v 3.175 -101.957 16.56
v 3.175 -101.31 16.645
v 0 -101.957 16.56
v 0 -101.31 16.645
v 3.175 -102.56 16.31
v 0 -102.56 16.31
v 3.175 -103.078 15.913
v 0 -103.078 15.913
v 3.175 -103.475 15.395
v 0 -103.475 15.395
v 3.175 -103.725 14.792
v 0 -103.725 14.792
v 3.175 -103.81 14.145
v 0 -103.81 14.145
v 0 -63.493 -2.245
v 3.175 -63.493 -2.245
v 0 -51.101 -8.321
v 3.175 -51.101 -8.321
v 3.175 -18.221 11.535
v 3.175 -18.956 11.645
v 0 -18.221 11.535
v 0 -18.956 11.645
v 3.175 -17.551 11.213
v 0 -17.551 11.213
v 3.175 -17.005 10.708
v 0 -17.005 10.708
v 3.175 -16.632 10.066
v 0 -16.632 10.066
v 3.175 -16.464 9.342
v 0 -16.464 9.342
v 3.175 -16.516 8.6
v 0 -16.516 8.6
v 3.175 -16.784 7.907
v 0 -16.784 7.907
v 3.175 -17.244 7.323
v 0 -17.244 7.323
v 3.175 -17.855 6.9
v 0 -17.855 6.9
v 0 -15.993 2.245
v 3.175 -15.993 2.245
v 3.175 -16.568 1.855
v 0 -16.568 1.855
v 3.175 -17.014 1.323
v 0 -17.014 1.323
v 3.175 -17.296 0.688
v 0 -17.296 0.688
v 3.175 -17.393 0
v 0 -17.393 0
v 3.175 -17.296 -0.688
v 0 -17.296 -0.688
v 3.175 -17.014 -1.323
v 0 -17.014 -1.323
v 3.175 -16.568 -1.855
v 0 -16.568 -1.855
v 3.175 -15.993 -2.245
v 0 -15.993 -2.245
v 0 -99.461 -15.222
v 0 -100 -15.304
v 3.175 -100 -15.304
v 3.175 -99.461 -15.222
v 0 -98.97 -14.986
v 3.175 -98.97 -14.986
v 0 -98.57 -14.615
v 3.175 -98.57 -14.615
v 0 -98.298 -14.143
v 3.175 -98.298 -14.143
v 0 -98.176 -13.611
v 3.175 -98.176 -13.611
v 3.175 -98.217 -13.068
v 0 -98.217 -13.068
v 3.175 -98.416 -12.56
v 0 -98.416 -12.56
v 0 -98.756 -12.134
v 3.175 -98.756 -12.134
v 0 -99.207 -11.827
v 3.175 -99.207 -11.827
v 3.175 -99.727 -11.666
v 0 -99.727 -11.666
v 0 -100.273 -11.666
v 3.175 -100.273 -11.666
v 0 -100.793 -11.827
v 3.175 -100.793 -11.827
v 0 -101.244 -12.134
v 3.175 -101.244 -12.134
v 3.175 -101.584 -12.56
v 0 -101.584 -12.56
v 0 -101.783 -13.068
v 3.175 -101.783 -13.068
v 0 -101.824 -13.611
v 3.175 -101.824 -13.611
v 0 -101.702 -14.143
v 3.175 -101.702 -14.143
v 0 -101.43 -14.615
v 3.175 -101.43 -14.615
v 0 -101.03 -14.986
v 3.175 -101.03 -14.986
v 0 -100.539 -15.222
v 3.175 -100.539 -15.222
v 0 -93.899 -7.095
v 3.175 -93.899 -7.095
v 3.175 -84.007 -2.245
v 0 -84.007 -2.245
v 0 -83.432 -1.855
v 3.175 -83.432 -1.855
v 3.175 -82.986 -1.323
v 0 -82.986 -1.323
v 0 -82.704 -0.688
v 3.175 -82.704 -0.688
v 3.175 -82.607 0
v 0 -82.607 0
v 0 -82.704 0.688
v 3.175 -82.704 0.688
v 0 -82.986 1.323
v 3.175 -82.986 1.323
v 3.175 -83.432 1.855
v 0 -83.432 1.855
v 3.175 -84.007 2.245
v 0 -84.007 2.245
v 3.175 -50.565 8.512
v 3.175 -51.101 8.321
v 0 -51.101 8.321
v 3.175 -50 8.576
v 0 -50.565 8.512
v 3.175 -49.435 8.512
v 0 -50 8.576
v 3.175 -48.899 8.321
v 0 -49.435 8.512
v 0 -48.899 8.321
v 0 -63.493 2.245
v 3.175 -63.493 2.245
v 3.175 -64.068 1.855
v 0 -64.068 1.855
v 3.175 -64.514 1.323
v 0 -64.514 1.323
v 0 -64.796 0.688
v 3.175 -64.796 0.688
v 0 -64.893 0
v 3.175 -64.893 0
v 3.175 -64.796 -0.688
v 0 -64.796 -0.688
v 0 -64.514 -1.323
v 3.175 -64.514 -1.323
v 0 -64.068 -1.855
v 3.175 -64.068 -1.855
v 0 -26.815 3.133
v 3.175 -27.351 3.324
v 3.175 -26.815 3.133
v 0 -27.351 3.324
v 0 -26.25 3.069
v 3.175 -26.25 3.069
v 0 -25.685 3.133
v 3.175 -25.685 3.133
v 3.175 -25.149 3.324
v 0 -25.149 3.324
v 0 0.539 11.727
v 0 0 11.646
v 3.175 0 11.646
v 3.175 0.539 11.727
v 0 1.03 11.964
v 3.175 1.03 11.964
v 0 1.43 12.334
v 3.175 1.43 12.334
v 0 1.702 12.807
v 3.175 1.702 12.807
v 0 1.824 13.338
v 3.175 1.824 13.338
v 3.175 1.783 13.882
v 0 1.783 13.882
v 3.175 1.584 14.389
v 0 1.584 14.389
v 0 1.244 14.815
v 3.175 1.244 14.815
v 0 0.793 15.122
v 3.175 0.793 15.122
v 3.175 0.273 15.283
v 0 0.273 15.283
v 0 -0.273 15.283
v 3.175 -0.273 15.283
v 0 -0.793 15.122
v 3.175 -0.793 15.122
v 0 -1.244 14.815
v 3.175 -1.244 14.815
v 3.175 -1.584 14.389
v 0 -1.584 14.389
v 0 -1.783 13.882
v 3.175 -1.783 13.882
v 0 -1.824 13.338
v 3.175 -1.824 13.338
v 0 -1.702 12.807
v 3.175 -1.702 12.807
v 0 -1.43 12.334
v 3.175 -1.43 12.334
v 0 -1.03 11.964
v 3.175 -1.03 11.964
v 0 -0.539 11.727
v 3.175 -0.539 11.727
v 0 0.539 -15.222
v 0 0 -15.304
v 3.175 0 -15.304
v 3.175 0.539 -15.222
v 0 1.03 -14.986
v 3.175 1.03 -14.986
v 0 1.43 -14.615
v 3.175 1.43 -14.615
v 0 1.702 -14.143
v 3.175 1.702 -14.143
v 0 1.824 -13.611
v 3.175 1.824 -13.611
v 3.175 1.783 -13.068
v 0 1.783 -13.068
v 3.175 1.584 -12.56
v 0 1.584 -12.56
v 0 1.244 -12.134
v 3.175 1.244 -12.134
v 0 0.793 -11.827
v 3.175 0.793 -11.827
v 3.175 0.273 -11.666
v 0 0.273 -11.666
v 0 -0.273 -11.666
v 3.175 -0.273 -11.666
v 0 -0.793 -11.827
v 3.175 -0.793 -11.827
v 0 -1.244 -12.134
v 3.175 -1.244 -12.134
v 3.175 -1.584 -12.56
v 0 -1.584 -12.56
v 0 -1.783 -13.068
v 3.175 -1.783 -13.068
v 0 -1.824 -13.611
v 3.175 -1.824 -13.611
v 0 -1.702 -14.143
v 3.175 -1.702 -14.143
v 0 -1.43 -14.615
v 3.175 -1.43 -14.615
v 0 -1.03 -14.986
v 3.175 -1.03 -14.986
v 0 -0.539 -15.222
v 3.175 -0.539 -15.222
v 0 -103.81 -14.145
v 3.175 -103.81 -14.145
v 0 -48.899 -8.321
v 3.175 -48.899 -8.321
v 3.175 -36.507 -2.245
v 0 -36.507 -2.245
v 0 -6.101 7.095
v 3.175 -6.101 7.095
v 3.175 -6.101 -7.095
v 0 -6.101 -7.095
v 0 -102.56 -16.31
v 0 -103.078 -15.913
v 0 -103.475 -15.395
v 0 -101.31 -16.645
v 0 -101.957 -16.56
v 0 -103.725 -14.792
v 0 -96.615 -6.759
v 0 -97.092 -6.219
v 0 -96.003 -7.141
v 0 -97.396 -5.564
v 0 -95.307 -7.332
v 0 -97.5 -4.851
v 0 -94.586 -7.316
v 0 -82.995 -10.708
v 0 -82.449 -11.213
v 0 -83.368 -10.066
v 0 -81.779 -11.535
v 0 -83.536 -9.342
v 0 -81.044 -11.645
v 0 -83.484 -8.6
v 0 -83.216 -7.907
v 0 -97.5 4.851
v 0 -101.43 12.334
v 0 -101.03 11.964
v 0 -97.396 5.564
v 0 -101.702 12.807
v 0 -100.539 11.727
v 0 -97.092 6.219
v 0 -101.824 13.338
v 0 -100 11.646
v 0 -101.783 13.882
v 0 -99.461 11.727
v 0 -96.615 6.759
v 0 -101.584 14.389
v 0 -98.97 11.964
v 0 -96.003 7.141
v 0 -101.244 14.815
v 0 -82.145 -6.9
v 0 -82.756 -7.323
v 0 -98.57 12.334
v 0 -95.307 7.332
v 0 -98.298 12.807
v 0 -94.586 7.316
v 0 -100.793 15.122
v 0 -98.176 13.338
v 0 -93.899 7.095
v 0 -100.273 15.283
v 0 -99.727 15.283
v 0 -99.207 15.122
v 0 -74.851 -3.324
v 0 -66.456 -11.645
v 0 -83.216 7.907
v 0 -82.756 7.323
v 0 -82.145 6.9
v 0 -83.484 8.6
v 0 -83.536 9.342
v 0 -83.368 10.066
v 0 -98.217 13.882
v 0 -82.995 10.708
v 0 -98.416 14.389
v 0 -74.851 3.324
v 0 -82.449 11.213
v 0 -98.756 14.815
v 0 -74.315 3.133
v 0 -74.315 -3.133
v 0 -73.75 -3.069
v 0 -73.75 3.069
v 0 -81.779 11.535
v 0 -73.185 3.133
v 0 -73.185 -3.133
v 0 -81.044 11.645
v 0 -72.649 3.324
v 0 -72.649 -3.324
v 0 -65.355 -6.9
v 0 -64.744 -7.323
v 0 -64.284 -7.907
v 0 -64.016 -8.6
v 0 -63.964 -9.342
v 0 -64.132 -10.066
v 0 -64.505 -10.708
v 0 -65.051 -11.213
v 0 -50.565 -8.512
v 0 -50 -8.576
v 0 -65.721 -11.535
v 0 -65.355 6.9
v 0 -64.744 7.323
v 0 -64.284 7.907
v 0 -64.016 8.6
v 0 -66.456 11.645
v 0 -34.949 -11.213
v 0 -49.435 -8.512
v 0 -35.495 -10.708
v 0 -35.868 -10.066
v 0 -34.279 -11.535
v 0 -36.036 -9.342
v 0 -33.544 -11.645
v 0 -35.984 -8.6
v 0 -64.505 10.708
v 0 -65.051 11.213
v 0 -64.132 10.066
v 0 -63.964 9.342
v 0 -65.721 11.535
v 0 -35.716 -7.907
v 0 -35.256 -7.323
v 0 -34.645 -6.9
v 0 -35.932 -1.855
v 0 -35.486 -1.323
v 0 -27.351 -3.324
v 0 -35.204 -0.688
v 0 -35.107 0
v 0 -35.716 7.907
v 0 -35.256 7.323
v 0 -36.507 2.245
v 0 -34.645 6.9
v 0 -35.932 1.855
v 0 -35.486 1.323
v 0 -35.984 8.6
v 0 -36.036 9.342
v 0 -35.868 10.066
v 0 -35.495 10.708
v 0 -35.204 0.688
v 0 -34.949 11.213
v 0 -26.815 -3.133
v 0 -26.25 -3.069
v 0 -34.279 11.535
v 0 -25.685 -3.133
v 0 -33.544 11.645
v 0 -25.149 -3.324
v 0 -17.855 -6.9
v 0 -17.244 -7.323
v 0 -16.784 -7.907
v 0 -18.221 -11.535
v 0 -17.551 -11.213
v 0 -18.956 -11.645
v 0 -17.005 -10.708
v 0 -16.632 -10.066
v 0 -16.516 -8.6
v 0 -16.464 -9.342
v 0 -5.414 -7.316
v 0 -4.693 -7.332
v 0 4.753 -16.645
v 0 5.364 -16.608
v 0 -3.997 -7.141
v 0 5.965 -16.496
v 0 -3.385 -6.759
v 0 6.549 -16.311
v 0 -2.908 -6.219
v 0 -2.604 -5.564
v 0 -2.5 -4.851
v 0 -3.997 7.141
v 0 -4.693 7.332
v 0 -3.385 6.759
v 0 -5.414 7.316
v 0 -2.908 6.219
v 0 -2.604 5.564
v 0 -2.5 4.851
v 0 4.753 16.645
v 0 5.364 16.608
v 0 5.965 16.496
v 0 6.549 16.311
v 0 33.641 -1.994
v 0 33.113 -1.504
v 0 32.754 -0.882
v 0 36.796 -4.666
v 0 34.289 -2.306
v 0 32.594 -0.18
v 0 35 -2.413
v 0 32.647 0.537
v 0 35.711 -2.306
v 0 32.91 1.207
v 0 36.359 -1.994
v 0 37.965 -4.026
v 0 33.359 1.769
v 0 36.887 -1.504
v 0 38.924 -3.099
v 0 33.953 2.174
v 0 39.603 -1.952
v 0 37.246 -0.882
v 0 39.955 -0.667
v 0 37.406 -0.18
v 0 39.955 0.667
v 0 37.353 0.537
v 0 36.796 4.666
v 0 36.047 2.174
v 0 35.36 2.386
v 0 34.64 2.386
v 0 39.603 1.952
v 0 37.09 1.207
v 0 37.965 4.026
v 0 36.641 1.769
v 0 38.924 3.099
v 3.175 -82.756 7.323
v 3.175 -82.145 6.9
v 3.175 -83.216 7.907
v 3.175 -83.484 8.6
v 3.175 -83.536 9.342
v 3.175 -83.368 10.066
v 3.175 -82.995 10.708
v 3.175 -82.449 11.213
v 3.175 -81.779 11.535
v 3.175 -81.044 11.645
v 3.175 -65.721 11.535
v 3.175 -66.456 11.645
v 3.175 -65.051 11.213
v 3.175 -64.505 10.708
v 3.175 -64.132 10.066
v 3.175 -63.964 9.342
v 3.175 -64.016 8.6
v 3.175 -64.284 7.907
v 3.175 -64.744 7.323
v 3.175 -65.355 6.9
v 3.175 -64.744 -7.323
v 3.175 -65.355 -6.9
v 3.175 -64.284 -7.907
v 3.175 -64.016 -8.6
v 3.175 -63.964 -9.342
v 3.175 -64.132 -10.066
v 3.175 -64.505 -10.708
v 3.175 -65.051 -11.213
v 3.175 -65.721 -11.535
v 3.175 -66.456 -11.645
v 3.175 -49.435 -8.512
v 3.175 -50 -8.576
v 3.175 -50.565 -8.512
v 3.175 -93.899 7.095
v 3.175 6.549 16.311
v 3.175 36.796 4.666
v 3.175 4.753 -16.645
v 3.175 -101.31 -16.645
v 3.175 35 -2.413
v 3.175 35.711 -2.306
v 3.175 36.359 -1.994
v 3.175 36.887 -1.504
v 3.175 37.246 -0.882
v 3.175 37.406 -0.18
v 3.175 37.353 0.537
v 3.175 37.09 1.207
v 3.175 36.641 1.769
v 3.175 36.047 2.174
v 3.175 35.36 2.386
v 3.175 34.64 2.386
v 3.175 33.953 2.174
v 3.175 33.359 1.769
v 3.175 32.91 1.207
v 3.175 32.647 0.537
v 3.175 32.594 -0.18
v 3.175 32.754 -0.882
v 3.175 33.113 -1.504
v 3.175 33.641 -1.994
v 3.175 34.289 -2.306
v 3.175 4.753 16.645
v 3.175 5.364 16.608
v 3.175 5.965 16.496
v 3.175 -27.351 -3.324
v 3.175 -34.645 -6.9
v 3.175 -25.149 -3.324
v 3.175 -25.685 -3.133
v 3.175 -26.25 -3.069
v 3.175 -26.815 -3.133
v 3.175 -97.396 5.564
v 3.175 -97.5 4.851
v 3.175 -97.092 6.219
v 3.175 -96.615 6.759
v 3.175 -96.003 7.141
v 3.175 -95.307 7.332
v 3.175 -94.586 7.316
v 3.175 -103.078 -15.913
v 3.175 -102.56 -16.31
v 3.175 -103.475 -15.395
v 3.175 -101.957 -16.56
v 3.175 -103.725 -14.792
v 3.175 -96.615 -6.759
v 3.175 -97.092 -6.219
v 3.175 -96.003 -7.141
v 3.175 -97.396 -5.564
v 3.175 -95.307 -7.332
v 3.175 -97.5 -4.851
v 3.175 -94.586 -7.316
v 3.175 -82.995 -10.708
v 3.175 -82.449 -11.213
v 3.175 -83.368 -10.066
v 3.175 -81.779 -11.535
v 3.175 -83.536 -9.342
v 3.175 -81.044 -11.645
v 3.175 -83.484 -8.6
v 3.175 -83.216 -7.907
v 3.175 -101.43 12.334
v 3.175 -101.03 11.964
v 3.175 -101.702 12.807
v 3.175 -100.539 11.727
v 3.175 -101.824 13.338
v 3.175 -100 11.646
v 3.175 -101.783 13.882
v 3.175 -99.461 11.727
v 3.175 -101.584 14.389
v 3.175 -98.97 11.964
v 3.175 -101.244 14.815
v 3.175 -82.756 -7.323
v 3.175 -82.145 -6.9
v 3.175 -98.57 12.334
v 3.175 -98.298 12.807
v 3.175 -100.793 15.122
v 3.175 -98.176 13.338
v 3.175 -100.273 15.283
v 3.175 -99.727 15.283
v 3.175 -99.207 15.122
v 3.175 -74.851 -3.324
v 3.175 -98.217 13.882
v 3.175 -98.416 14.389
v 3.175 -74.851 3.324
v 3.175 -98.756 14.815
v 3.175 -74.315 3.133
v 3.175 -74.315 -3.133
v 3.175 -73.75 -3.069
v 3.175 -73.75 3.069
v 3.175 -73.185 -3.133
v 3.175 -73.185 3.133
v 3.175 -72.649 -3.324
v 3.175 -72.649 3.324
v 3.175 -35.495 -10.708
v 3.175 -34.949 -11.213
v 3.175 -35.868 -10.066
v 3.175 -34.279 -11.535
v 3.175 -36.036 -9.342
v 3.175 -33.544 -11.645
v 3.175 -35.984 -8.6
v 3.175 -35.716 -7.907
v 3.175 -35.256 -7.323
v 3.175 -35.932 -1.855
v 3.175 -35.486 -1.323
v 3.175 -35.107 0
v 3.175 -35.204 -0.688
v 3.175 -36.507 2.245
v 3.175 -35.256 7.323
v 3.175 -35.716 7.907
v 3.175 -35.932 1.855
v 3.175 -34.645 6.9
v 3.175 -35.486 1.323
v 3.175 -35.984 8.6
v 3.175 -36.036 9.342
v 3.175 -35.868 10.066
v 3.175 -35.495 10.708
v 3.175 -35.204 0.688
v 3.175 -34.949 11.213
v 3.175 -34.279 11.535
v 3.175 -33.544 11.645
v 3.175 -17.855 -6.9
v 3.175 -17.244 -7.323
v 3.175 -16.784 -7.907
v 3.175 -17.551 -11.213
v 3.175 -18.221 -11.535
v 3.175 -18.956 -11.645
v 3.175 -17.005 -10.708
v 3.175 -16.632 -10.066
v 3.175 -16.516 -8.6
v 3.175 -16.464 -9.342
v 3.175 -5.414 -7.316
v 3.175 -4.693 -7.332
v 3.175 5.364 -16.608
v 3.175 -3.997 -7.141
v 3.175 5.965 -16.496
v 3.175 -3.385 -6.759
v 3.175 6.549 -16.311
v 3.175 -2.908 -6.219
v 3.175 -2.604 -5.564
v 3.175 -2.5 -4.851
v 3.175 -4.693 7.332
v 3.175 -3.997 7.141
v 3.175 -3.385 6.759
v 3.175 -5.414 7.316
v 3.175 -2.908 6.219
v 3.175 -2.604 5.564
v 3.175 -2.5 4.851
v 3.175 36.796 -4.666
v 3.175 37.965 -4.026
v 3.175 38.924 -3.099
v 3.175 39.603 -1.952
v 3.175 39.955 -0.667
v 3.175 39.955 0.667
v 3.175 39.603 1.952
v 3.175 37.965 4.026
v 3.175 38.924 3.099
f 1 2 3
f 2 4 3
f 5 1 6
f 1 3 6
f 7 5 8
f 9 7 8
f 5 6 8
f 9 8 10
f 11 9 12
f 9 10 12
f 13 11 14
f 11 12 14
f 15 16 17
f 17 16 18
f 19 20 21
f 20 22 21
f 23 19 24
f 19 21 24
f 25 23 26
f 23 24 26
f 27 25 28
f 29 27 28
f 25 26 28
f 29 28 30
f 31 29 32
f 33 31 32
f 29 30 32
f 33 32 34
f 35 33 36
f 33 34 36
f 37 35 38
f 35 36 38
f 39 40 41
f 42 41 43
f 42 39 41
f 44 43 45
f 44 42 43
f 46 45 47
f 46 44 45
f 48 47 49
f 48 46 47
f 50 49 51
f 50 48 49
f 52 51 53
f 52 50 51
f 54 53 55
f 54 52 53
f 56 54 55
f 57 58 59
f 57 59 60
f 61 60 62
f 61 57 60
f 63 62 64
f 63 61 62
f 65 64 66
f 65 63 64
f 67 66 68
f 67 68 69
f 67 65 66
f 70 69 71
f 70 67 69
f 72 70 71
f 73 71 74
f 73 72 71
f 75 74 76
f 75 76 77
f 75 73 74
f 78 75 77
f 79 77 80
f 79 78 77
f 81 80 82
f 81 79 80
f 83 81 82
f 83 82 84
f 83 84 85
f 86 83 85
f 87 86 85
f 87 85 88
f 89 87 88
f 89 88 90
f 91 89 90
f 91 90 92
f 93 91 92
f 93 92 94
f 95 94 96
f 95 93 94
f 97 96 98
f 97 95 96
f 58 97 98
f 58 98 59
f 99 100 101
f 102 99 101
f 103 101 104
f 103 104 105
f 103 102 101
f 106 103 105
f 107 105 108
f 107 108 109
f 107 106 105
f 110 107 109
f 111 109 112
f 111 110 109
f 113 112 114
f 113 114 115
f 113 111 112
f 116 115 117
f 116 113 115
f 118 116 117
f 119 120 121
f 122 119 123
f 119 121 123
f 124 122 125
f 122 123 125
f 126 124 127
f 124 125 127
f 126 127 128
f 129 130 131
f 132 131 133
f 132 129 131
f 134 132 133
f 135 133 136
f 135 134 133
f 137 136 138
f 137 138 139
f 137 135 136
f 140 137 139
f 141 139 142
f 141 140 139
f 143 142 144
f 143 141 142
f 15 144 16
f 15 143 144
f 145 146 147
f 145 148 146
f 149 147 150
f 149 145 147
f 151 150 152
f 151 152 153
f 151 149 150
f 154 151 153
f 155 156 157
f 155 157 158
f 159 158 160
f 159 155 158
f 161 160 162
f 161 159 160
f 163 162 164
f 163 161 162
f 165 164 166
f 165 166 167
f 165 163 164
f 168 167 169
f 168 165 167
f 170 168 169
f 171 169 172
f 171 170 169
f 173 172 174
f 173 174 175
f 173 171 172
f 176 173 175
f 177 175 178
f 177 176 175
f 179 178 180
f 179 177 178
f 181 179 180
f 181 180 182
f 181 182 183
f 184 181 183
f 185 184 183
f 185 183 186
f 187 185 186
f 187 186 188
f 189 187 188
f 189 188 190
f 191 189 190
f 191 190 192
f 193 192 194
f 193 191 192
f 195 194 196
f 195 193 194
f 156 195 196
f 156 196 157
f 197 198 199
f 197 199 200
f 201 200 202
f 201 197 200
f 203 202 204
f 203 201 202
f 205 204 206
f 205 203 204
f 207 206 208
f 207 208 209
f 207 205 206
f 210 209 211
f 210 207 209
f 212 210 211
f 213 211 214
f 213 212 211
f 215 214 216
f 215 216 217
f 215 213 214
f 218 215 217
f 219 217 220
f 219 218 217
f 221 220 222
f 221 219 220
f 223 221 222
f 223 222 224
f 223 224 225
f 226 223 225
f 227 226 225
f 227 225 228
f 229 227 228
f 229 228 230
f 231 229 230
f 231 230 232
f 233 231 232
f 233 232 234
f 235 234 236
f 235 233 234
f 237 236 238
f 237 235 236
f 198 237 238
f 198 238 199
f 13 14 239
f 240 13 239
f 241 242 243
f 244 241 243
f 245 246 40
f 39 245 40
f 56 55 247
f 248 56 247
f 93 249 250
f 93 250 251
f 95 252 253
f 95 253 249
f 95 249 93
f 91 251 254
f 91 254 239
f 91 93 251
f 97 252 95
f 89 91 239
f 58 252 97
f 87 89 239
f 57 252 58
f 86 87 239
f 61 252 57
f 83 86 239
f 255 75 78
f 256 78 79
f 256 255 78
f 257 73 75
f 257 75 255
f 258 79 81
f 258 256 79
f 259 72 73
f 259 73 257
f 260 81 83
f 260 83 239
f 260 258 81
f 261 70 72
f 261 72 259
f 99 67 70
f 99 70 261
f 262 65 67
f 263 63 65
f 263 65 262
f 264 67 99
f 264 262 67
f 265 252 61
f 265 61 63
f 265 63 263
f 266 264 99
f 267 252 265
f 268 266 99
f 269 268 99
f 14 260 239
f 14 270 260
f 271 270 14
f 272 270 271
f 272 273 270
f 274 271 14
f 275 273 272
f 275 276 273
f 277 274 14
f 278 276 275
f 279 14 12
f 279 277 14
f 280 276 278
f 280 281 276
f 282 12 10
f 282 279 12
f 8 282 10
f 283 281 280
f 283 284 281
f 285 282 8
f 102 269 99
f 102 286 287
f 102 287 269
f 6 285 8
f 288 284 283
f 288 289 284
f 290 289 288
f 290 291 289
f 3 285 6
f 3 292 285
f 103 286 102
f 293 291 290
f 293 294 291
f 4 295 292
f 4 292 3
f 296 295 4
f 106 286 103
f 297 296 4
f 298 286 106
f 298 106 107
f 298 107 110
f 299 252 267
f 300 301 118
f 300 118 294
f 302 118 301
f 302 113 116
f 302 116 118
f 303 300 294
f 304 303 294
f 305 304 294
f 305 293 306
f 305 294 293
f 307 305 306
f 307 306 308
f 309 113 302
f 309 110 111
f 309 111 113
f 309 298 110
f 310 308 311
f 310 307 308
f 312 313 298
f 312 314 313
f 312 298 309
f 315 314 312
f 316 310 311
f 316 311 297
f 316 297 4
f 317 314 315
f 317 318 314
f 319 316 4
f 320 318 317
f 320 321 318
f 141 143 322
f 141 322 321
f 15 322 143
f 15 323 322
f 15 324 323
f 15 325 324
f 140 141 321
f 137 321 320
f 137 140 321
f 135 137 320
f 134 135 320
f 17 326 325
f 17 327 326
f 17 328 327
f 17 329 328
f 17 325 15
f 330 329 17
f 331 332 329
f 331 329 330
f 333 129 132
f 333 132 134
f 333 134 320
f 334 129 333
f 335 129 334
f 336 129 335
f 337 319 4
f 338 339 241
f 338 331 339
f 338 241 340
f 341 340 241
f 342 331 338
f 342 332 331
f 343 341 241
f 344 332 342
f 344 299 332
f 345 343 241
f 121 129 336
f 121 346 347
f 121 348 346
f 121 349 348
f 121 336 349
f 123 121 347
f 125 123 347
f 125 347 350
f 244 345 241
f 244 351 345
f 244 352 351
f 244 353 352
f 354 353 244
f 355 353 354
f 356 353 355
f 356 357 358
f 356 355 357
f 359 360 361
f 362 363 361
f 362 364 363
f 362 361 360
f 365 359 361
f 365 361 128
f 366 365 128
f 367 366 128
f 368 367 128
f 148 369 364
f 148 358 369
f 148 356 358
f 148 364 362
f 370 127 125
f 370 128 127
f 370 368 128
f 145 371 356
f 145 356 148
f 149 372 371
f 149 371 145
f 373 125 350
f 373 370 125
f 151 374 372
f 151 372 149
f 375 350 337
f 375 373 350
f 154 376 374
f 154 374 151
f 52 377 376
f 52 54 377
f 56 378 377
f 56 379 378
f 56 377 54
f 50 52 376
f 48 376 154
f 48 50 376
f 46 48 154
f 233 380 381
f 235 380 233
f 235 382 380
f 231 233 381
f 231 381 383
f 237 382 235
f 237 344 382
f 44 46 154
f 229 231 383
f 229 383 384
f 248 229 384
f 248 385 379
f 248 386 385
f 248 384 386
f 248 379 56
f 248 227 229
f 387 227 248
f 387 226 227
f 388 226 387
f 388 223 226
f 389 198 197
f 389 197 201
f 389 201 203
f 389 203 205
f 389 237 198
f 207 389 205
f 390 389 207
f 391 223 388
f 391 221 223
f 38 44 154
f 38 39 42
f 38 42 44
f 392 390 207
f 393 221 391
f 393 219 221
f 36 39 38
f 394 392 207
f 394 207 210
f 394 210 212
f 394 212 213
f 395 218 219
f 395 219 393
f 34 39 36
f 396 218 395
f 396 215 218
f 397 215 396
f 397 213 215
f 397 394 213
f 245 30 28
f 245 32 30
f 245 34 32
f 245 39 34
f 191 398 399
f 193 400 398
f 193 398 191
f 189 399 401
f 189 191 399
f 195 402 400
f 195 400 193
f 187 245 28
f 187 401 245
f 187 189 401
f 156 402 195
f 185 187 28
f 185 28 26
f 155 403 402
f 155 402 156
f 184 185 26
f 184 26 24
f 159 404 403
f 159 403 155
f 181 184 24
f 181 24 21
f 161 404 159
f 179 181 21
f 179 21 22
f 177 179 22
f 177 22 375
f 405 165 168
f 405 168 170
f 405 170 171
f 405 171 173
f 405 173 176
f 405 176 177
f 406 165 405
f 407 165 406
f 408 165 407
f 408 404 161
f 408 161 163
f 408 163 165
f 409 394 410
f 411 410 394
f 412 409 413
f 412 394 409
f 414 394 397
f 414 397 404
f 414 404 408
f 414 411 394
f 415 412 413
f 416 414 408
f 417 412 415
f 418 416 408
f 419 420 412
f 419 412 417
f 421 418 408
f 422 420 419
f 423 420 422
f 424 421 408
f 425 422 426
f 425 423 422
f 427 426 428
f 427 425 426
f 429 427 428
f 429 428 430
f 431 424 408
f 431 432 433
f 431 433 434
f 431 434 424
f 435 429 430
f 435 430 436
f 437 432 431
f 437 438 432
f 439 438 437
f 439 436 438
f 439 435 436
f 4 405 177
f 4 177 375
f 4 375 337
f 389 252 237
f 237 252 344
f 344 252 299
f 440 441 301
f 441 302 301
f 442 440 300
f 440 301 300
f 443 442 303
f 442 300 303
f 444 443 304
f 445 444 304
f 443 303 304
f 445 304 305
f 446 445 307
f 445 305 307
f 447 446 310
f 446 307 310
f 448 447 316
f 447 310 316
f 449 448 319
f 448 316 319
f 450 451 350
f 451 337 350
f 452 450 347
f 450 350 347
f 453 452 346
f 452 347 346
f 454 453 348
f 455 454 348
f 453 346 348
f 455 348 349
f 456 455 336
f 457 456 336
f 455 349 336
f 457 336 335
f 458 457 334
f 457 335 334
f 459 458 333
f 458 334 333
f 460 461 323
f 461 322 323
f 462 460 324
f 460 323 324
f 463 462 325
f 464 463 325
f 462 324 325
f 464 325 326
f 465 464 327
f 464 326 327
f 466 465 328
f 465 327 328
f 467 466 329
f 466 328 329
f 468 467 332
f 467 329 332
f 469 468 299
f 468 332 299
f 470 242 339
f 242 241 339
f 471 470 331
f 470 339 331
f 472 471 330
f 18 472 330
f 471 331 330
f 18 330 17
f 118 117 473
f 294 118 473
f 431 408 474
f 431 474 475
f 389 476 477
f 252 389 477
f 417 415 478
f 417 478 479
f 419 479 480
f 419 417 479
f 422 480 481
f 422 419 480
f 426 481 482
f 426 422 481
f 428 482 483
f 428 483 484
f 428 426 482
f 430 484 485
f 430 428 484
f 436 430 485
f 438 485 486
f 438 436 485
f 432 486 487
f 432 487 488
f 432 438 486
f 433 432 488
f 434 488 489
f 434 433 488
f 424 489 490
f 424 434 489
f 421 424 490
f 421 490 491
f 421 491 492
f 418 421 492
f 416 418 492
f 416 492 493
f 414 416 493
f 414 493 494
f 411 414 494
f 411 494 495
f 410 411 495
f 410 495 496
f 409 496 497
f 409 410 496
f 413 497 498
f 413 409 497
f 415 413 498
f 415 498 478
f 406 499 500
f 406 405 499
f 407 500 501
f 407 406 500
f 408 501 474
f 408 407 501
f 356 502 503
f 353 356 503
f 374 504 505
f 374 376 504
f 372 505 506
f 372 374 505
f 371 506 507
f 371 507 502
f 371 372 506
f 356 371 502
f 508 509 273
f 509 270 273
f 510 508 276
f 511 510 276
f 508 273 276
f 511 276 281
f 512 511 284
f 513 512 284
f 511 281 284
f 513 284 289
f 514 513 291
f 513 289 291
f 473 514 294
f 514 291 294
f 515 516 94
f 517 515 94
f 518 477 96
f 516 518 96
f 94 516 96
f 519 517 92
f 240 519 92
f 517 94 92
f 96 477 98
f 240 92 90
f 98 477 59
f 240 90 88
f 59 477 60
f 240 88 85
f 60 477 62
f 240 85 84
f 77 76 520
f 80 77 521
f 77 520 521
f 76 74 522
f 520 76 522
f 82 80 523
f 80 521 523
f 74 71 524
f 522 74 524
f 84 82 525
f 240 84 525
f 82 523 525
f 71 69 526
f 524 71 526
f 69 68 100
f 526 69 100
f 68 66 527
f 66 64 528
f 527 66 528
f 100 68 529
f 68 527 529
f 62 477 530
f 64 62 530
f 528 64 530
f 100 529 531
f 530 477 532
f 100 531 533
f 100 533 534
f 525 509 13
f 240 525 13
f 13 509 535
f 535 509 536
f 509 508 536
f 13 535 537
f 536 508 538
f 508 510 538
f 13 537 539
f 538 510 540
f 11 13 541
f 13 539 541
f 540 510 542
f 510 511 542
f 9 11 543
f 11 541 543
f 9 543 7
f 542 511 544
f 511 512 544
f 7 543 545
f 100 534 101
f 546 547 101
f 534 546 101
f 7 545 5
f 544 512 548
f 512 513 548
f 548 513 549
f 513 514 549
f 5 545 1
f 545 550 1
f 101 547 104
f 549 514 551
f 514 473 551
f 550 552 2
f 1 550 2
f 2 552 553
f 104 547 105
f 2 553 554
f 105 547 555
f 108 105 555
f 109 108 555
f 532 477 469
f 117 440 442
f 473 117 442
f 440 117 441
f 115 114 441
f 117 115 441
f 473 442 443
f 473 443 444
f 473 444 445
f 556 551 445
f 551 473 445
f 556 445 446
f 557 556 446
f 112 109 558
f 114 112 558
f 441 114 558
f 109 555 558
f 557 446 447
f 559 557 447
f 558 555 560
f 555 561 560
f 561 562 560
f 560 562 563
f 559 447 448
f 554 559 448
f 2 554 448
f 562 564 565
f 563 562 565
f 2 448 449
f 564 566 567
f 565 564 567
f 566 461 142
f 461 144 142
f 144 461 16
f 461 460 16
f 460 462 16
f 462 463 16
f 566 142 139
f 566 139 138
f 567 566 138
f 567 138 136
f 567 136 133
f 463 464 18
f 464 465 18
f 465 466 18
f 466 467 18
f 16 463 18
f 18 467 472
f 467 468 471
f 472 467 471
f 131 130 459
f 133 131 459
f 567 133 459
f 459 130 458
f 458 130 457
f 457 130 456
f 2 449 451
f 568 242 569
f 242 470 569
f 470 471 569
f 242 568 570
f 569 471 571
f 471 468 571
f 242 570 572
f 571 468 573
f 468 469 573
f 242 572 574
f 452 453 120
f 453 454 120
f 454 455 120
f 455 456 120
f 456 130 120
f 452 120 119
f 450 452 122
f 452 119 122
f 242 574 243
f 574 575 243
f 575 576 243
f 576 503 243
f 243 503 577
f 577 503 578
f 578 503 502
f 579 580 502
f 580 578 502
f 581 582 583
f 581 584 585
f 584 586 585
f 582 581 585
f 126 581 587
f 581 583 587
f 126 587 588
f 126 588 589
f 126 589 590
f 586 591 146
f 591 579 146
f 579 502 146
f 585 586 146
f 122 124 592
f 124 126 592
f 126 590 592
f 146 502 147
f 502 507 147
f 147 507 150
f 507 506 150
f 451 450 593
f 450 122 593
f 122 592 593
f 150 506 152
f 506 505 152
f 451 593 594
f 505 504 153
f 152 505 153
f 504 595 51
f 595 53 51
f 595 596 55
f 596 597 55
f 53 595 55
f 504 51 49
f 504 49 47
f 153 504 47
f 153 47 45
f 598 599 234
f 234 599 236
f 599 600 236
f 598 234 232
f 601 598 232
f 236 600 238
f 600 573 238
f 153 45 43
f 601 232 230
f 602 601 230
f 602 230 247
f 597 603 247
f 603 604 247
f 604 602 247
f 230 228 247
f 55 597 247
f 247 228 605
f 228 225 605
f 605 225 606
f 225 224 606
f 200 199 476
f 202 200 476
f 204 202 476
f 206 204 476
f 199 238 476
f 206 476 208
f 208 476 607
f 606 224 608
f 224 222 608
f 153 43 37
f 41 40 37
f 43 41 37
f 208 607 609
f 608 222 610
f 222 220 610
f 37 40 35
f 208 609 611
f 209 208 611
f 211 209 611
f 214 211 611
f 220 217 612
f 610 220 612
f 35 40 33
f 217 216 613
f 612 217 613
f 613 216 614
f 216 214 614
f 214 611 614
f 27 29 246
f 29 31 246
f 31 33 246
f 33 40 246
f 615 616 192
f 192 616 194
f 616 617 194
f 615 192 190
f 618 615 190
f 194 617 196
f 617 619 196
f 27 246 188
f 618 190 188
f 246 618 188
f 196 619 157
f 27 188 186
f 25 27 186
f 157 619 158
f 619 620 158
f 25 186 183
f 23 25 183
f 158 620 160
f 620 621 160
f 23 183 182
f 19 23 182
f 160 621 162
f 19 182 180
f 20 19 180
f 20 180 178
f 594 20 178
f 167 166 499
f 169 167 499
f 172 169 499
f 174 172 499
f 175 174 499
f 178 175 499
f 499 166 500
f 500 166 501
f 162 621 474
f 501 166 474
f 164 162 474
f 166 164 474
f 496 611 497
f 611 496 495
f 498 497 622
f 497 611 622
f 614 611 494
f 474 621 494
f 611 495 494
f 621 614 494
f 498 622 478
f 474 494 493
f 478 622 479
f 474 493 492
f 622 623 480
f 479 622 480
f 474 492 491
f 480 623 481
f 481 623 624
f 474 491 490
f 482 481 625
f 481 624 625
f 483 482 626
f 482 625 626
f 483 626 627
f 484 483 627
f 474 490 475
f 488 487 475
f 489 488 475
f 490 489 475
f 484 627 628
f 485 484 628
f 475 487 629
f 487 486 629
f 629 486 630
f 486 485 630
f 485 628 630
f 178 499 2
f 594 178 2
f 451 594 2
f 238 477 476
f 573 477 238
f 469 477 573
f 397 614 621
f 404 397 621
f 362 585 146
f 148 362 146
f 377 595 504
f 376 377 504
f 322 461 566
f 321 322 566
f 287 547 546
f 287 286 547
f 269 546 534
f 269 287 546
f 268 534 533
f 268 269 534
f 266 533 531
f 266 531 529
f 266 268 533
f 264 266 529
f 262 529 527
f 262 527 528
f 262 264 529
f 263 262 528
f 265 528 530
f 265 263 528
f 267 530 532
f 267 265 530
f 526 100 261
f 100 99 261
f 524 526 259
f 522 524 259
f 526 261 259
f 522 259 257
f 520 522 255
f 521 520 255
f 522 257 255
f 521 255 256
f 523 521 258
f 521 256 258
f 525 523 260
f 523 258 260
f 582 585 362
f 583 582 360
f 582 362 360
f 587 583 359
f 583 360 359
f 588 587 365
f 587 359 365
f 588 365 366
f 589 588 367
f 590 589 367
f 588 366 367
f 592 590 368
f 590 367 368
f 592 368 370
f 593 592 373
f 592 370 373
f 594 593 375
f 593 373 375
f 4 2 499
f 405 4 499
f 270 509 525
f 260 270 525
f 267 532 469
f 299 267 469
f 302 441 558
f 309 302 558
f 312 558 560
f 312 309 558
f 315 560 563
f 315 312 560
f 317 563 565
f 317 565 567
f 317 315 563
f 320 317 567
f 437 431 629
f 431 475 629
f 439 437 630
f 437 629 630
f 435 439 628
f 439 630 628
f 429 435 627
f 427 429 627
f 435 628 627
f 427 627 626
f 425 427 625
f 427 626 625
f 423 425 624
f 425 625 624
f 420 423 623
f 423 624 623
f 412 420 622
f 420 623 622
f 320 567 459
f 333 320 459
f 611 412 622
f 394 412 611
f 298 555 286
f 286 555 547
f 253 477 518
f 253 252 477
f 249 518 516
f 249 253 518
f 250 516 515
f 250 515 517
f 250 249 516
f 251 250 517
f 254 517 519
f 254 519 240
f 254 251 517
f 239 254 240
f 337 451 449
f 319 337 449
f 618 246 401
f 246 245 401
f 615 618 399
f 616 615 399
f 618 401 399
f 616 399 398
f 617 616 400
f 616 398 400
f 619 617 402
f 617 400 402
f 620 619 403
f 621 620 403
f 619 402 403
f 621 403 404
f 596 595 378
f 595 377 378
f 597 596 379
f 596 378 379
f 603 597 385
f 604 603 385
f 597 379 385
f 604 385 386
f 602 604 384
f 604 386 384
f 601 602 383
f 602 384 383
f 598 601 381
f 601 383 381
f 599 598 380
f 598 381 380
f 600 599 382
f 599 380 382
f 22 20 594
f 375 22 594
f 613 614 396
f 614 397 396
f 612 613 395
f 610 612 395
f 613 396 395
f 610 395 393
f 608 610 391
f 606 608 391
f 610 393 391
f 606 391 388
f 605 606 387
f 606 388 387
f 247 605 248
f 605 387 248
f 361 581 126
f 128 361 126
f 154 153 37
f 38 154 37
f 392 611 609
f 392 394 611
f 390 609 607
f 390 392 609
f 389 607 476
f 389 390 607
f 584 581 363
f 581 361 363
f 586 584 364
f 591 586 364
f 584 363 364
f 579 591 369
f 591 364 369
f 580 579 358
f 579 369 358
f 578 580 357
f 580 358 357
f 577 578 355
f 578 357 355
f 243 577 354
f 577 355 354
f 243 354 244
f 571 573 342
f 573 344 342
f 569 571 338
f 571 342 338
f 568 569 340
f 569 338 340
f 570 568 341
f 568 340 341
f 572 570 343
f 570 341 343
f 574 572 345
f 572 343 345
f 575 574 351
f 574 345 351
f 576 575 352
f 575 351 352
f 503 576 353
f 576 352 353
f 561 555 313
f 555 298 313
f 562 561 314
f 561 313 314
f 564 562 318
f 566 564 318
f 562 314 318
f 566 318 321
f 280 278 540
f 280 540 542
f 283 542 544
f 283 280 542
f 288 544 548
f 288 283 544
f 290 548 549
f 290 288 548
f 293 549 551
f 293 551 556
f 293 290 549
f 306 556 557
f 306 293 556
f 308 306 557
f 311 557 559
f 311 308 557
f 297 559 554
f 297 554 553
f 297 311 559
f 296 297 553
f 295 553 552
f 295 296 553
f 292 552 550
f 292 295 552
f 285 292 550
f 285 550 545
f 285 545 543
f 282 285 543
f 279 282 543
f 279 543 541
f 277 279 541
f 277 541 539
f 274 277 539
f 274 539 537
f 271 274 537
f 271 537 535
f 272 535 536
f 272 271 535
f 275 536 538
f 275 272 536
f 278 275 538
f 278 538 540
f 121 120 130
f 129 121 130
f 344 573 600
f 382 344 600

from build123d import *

# Parameters (mm, degrees)
SKETCH1_W           = 41.514809608
SKETCH1_H           = 98.81
SKETCH1_R           = 1.8288
SKETCH1_R_2         = 2.413
BOSS_EXTRUDE1_DEPTH = 3.175
CUT_EXTRUDE1_DEPTH  = 106.912542124
FILLET1_R           = 2.5
FILLET2_R           = 5


with BuildPart() as part:
    # Sketch1 → Boss-Extrude1 (new body)
    # profile 1 of 2: a face of its own
    with BuildSketch(Plane(origin=(0, 0, 0), x_dir=(0, 0, -1), z_dir=(1, 0, 0))):
        with Locations((0, -54.405)):
            Rectangle(SKETCH1_W, SKETCH1_H)
        with Locations((13.4747, -100)):
            Circle(SKETCH1_R, mode=Mode.SUBTRACT)
        with Locations((-13.4747, -100)):
            Circle(SKETCH1_R, mode=Mode.SUBTRACT)
    # profile 2 of 2: a face of its own
    with BuildSketch(Plane(origin=(0, 0, 0), x_dir=(0, 0, -1), z_dir=(1, 0, 0))):
        Polygon((0, 48.916537522), (20.757404804, -5), (-20.757404804, -5), align=None)
        with Locations((13.4747, 0)):
            Circle(SKETCH1_R, mode=Mode.SUBTRACT)
        with Locations((0, 35)):
            Circle(SKETCH1_R_2, mode=Mode.SUBTRACT)
        with Locations((-13.4747, 0)):
            Circle(SKETCH1_R, mode=Mode.SUBTRACT)
    extrude(amount=BOSS_EXTRUDE1_DEPTH)

    # Sketch2 → Cut-Extrude1 (cut, through all)
    with BuildSketch(Plane(origin=(3.175, 0, 0), x_dir=(0, 0, -1), z_dir=(1, 0, 0))):
        Polygon((16.645, 5.681808734), (16.645, -103.81), (20.757404804, -103.81), (20.757404804, -5), align=None)
        Polygon((-20.757404804, -103.81), (-16.645, -103.81), (-16.645, 5.681808734), (-20.757404804, -5), align=None)
        Polygon((-11.645, -91.821329309), (-2.784341903, -73.75), (-11.645, -55.678670691), align=None)
        Polygon((8.860658097, -97.5), (0, -79.428670691), (-8.860658097, -97.5), align=None)
        Polygon((2.784341903, -73.75), (11.645, -91.821329309), (11.645, -55.678670691), align=None)
        Polygon((-8.860658097, -50), (0, -68.071329309), (8.860658097, -50), (0, -31.928670691), align=None)
        Polygon((11.645, -8.178670691), (2.784341903, -26.25), (11.645, -44.321329309), align=None)
        Polygon((-11.645, -44.321329309), (-2.784341903, -26.25), (-11.645, -8.178670691), align=None)
        Polygon((-8.860658097, -2.5), (0, -20.571329309), (8.860658097, -2.5), align=None)
    extrude(amount=-CUT_EXTRUDE1_DEPTH, mode=Mode.SUBTRACT)

    # Fillet1
    fillet1_edges = [part.edges().sort_by_distance(p)[0] for p in [
        (1.5875, -91.821329309, -11.645),
        (1.5875, -73.75, -2.784341903),
        (1.5875, -55.678670691, -11.645),
        (1.5875, -97.5, 8.860658097),
        (1.5875, -79.428670691, 0),
        (1.5875, -97.5, -8.860658097),
        (1.5875, -103.81, -16.645),
        (1.5875, -44.321329309, -11.645),
        (1.5875, -26.25, -2.784341903),
        (1.5875, -8.178670691, -11.645),
        (1.5875, -50, -8.860658097),
        (1.5875, -68.071329309, 0),
        (1.5875, -50, 8.860658097),
        (1.5875, -31.928670691, 0),
        (1.5875, -2.5, -8.860658097),
        (1.5875, -20.571329309, 0),
        (1.5875, -2.5, 8.860658097),
        (1.5875, -8.178670691, 11.645),
        (1.5875, -26.25, 2.784341903),
        (1.5875, -44.321329309, 11.645),
        (1.5875, -103.81, 16.645),
        (1.5875, -55.678670691, 11.645),
        (1.5875, -73.75, 2.784341903),
        (1.5875, -91.821329309, 11.645),
    ]]
    fillet(fillet1_edges, radius=FILLET1_R)

    # Fillet2
    fillet2_edges = [part.edges().sort_by_distance(p)[0] for p in [
        (1.5875, 48.916537522, 0),
        (1.5875, 5.681808734, -16.645),
        (1.5875, 5.681808734, 16.645),
    ]]
    fillet(fillet2_edges, radius=FILLET2_R)


solid = part.part
